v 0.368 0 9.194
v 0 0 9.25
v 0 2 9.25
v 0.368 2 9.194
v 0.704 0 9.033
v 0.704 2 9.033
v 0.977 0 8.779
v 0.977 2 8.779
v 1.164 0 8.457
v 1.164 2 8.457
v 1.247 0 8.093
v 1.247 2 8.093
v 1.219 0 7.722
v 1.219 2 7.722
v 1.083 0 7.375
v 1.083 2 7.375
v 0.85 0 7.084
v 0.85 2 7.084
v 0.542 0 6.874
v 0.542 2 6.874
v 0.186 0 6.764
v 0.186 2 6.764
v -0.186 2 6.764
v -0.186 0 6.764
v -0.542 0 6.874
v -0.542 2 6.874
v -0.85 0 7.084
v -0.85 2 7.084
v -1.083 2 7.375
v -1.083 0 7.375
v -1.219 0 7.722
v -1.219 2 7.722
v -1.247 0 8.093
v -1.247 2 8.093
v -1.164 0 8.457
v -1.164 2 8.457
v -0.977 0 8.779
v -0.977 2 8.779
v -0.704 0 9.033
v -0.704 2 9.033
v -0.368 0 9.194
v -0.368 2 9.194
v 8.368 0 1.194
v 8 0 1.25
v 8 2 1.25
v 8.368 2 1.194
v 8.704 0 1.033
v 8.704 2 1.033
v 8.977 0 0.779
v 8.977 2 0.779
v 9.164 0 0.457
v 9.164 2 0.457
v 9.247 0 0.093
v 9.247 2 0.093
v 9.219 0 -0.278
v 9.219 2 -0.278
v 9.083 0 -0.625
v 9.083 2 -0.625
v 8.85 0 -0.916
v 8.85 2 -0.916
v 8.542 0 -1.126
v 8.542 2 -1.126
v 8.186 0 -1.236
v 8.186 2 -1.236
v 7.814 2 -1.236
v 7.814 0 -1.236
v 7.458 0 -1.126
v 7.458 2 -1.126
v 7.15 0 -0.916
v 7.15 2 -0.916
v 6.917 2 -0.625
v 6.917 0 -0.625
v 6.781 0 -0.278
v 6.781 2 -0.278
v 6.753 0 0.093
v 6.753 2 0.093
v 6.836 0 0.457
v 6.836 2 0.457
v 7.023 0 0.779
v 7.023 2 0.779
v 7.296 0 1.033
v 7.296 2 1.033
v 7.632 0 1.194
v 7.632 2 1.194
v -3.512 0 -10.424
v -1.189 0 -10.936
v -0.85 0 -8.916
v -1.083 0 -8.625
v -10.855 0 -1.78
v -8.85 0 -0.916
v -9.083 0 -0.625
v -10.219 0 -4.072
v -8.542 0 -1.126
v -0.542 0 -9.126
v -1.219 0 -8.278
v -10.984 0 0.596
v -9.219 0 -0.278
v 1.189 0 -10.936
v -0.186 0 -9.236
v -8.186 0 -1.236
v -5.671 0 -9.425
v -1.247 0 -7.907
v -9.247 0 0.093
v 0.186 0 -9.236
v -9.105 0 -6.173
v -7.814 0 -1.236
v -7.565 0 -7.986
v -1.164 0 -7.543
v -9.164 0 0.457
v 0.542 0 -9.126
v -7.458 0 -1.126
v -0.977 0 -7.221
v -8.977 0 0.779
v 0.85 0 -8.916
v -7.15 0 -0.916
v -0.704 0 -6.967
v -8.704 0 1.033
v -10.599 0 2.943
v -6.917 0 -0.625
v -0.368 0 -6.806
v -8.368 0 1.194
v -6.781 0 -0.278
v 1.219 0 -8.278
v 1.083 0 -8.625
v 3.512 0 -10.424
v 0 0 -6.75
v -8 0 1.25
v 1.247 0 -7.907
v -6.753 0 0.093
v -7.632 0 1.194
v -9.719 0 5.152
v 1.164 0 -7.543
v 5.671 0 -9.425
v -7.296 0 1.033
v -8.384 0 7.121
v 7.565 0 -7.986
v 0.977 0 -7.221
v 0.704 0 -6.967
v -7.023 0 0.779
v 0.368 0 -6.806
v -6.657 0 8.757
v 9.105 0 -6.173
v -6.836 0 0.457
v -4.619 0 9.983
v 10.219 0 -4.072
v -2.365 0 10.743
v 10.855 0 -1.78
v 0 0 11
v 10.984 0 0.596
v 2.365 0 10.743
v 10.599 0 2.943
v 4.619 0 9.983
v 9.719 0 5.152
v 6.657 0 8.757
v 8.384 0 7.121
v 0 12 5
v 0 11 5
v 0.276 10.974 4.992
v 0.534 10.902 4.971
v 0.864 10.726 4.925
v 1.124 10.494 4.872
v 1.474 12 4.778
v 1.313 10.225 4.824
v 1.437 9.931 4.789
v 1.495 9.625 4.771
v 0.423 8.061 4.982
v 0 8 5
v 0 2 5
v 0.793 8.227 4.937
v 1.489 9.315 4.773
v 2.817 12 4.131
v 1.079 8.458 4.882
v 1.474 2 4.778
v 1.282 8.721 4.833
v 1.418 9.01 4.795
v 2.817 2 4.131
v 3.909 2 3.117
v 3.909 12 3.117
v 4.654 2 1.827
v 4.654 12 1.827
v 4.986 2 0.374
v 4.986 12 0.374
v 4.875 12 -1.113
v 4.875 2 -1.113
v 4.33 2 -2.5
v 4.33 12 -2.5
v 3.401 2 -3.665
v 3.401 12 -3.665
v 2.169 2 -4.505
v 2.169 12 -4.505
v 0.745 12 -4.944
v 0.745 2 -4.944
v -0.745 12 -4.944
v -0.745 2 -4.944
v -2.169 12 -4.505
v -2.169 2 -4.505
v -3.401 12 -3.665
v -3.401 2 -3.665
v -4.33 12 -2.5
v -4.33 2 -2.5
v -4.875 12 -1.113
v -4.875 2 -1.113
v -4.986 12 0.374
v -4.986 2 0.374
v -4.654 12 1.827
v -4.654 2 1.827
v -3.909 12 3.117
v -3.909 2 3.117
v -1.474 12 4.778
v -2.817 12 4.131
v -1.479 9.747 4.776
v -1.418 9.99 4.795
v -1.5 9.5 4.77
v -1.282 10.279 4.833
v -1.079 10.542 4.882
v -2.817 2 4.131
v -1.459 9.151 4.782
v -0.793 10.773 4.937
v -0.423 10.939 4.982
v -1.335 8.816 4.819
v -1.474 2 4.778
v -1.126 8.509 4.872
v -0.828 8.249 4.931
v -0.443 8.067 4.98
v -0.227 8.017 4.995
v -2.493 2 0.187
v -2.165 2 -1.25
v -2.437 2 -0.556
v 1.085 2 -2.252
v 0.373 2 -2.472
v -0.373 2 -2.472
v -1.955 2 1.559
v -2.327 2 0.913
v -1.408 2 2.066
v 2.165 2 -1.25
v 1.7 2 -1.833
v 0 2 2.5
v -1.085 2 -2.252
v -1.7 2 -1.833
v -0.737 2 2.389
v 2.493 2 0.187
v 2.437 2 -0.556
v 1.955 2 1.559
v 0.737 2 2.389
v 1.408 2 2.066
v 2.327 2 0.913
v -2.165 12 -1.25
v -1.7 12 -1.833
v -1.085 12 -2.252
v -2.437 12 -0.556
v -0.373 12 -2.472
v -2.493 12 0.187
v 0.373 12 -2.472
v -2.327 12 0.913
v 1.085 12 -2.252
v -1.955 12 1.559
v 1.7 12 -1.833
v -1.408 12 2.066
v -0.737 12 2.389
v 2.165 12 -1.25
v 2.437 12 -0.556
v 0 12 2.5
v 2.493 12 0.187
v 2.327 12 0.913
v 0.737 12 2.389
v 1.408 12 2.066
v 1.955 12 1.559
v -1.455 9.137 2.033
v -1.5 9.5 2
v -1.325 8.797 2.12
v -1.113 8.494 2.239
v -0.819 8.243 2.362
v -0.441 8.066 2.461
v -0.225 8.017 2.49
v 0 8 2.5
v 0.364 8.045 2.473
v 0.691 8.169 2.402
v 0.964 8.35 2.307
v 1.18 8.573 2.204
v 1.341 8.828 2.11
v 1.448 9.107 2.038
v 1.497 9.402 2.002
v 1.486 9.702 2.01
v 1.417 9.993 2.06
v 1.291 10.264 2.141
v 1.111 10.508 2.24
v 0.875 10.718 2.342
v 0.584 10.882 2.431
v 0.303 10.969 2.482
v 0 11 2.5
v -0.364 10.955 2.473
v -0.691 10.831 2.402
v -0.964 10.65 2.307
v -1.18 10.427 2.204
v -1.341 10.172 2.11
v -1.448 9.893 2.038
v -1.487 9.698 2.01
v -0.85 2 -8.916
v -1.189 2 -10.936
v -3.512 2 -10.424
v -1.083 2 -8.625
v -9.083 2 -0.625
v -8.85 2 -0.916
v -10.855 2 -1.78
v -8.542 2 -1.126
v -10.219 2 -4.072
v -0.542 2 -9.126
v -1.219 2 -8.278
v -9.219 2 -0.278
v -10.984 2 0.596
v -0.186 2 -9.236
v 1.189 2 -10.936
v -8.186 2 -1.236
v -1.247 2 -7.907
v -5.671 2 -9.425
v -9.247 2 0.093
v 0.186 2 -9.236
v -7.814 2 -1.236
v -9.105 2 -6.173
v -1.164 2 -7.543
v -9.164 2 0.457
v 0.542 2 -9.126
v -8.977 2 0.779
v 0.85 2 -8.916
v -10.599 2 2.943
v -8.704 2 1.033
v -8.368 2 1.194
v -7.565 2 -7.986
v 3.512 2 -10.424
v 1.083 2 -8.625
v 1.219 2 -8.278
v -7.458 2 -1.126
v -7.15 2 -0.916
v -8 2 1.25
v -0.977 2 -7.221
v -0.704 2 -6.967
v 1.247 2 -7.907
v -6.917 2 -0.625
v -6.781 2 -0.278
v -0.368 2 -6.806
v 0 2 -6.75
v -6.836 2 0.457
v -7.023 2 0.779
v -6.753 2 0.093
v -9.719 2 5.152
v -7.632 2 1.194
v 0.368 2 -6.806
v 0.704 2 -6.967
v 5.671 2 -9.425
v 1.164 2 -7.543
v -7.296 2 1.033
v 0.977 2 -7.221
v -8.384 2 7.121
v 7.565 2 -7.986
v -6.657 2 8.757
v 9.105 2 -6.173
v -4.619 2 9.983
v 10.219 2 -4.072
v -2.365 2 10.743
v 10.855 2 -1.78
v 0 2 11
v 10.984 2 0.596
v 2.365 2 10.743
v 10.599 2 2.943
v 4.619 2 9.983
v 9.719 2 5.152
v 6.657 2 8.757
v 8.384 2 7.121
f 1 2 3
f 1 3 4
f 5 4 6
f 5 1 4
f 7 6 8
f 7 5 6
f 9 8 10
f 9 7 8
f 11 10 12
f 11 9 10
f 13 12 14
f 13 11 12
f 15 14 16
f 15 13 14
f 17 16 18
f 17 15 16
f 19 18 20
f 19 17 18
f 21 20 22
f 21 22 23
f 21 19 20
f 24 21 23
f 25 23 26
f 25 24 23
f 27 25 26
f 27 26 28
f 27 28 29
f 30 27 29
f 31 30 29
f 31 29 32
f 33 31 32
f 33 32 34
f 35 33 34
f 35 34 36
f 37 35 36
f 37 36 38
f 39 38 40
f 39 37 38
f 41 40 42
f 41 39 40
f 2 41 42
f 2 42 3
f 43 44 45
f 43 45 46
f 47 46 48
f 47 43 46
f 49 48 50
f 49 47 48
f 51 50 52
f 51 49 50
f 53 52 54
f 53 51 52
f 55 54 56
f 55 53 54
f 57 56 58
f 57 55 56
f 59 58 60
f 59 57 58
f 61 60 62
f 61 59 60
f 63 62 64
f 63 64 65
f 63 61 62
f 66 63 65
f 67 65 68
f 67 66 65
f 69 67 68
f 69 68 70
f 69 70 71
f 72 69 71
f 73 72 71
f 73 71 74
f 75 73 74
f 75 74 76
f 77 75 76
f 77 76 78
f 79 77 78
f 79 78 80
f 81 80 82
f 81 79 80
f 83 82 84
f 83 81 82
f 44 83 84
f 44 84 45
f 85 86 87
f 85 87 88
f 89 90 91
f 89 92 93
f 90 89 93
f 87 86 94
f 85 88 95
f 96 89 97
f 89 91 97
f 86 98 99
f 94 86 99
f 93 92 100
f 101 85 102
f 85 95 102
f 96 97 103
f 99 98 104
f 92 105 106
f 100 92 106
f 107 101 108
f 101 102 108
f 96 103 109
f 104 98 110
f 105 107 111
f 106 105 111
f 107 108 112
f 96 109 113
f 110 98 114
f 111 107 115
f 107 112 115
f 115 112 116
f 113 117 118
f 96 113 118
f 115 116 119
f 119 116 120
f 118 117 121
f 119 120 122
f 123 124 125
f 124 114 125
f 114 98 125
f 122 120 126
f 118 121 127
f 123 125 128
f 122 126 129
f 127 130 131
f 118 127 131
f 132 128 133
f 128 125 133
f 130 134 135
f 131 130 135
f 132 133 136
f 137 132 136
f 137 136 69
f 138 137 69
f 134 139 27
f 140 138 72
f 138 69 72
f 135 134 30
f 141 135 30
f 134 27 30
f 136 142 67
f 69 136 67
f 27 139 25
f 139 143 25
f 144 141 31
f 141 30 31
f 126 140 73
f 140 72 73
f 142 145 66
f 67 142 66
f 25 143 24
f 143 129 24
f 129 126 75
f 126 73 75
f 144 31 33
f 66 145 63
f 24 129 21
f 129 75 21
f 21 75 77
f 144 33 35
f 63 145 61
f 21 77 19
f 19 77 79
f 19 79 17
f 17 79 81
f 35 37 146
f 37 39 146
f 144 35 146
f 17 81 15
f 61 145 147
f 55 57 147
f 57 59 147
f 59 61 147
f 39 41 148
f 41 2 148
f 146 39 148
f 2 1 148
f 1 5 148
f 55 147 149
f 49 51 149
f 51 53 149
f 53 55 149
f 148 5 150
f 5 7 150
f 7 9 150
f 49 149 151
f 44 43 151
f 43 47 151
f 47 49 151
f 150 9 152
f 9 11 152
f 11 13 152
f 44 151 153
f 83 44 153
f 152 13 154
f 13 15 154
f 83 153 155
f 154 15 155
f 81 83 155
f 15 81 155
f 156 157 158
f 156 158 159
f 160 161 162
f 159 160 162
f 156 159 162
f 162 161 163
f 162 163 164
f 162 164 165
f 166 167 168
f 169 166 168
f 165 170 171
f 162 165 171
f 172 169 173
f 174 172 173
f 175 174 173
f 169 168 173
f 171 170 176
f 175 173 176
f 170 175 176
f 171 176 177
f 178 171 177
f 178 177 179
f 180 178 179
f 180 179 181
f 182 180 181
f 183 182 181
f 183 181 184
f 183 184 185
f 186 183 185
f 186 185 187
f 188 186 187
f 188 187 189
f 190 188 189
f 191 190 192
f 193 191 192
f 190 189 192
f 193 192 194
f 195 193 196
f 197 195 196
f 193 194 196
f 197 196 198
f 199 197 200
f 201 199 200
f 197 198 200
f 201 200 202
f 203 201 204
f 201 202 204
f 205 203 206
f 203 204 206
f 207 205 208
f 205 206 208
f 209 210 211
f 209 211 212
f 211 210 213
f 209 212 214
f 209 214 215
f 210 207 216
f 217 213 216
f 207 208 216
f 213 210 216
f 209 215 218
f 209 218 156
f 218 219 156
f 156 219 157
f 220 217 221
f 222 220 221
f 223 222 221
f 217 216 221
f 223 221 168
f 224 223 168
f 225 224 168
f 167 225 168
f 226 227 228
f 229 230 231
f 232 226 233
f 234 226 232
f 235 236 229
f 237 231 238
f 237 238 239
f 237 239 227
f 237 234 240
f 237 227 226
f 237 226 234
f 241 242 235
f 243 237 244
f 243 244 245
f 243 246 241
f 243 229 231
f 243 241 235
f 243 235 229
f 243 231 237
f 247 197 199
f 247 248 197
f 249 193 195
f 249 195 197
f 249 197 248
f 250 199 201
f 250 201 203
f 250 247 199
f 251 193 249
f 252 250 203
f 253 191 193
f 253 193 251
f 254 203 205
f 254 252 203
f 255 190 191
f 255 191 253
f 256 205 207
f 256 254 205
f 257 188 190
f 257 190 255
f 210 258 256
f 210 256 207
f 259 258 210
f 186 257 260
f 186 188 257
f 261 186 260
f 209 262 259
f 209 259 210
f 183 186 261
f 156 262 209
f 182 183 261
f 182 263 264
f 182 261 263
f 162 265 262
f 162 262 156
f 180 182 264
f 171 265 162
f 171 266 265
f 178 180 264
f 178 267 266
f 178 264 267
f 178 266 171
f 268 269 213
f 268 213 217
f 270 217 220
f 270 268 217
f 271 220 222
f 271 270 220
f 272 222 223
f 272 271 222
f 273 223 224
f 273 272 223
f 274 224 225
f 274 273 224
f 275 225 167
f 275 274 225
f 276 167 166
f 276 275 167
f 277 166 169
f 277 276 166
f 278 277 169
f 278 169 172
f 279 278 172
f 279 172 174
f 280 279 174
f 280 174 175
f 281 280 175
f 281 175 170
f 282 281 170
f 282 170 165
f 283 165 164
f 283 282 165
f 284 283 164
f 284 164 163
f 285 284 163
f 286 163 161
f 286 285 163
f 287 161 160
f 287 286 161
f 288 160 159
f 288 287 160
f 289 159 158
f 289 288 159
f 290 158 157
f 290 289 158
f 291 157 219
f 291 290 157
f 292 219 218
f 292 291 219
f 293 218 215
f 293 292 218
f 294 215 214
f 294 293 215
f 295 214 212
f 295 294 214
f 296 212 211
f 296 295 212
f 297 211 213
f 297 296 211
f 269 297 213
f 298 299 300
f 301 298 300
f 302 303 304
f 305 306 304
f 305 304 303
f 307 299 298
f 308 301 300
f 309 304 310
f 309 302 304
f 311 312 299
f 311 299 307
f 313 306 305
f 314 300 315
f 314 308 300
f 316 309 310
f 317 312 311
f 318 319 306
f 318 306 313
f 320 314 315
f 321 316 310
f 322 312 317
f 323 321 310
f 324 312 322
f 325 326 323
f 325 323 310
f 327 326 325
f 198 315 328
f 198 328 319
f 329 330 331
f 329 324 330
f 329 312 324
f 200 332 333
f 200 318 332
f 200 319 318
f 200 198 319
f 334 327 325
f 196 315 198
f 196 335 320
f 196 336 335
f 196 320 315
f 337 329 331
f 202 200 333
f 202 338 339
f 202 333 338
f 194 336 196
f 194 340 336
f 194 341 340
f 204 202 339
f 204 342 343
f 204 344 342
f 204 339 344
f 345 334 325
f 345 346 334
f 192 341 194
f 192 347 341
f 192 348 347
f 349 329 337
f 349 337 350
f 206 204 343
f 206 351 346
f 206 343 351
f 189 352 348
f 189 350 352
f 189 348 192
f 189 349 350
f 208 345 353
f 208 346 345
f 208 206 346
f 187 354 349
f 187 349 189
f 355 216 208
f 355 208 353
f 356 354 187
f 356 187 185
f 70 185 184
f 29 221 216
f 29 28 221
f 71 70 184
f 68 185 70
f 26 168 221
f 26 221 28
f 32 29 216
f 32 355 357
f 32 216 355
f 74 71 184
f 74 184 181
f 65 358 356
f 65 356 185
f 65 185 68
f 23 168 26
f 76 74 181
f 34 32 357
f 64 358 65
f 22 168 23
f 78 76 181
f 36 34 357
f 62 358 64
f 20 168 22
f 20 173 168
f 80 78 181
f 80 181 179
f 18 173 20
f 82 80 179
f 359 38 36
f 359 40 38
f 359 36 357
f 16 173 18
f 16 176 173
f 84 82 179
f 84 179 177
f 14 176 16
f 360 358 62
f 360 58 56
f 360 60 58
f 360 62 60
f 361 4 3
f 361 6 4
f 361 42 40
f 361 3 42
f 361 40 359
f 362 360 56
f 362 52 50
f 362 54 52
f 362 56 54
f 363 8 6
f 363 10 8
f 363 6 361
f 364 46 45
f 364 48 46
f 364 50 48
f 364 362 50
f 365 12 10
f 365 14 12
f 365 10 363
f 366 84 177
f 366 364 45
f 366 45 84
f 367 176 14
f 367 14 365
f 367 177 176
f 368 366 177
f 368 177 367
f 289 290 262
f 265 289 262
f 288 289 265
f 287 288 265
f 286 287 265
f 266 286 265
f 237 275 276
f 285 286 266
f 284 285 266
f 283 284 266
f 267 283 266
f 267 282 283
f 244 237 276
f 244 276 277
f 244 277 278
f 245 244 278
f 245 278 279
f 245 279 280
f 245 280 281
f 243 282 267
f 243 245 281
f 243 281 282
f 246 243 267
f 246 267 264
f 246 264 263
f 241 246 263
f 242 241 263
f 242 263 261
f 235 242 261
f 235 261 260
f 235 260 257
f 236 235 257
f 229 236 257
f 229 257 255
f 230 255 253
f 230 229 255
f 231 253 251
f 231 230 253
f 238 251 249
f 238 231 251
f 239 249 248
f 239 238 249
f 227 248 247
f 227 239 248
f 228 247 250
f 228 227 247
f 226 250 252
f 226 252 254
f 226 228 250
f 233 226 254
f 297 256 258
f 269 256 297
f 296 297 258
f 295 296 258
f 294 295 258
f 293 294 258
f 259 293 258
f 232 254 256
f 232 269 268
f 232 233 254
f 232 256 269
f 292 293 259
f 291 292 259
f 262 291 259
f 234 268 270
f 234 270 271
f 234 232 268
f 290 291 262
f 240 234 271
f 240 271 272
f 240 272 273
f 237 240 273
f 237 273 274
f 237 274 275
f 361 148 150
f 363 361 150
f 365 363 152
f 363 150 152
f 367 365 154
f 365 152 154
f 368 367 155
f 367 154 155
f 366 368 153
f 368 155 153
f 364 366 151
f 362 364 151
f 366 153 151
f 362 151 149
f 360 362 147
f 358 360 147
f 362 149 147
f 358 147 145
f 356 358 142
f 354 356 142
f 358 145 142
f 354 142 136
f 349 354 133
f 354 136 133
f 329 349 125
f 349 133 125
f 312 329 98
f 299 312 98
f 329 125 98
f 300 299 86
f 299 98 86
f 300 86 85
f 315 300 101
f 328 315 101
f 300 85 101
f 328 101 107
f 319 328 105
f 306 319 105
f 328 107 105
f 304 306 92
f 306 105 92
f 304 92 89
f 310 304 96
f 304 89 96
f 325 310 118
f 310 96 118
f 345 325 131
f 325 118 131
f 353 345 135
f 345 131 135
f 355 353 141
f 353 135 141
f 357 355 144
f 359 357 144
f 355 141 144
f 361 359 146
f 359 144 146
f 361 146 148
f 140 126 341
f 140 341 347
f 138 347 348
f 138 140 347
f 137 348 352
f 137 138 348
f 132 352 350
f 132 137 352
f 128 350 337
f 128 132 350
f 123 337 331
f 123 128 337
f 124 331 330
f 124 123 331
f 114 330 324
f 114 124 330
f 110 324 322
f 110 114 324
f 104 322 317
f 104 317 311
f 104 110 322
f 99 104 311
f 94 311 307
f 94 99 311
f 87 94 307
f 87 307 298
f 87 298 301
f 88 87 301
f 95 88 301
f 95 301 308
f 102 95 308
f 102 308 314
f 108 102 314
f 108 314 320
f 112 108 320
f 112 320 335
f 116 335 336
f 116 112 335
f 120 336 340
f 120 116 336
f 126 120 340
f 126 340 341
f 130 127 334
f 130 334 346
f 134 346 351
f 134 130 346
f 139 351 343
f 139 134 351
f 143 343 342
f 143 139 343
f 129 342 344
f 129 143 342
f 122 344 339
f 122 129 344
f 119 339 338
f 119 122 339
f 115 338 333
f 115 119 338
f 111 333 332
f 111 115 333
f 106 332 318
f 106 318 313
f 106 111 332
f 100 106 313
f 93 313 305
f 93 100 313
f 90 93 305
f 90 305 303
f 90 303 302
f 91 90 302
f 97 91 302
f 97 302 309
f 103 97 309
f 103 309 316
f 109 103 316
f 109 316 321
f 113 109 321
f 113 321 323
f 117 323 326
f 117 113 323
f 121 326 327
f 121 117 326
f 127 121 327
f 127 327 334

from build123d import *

# Parameters (mm, degrees)
SKETCH_1_R               = 11
SKETCH_1_R_2             = 1.25
EXTRUDE_1_DEPTH          = 2
SKETCH_2_R               = 5
SKETCH_2_R_2             = 2.5
EXTRUDE_2_DEPTH          = 10
CUT_EXTRUDE_1_REACH      = 21.647
CUT_EXTRUDE_1_END_RADIUS = 5
SKETCH_3_R               = 1.5


with BuildPart() as part:
    # 草圖1 → 填料-伸長1 (new body)
    with BuildSketch(Plane(origin=(0, 0, 0), x_dir=(1, 0, 0), z_dir=(0, 1, 0))):
        with Locations(Location((0, 0, 0), (0, 0, 270))):
            Circle(SKETCH_1_R)
        with Locations(Location((0, 8, 0), (0, 0, 270))):
            Circle(SKETCH_1_R_2, mode=Mode.SUBTRACT)
        with Locations(Location((8, 0, 0), (0, 0, 270))):
            Circle(SKETCH_1_R_2, mode=Mode.SUBTRACT)
        with Locations(Location((0, -8, 0), (0, 0, 270))):
            Circle(SKETCH_1_R_2, mode=Mode.SUBTRACT)
        with Locations(Location((-8, 0, 0), (0, 0, 270))):
            Circle(SKETCH_1_R_2, mode=Mode.SUBTRACT)
    extrude(amount=EXTRUDE_1_DEPTH)

    # 草圖2 → 填料-伸長2 (add)
    with BuildSketch(Plane(origin=(0, 2, 0), x_dir=(1, 0, 0), z_dir=(0, 1, 0))):
        with Locations(Location((0, 0, 0), (0, 0, 270))):
            Circle(SKETCH_2_R)
        with Locations(Location((0, 0, 0), (0, 0, 270))):
            Circle(SKETCH_2_R_2, mode=Mode.SUBTRACT)
    extrude(amount=EXTRUDE_2_DEPTH)

    # 除料-伸長1: up to this cylinder (the profile starts inside it)
    cut_extrude_1_end = Plane(origin=(0, 9.5, 0), z_dir=(0, -1, 0)) * Cylinder(CUT_EXTRUDE_1_END_RADIUS, 54.294, mode=Mode.PRIVATE)
    # 草圖3 → 除料-伸長1 (cut, up to the surface)
    with BuildSketch(Plane.XY, mode=Mode.PRIVATE) as cut_extrude_1_sk1:
        with Locations(Location((0, 9.5, 0), (0, 0, 180))):
            Circle(SKETCH_3_R)
    cut_extrude_1_tool1 = extrude(cut_extrude_1_sk1.sketch, amount=CUT_EXTRUDE_1_REACH, mode=Mode.PRIVATE) & cut_extrude_1_end
    add(cut_extrude_1_tool1.solids().sort_by_distance((0, 9.5, 0))[0], mode=Mode.SUBTRACT)


solid = part.part
